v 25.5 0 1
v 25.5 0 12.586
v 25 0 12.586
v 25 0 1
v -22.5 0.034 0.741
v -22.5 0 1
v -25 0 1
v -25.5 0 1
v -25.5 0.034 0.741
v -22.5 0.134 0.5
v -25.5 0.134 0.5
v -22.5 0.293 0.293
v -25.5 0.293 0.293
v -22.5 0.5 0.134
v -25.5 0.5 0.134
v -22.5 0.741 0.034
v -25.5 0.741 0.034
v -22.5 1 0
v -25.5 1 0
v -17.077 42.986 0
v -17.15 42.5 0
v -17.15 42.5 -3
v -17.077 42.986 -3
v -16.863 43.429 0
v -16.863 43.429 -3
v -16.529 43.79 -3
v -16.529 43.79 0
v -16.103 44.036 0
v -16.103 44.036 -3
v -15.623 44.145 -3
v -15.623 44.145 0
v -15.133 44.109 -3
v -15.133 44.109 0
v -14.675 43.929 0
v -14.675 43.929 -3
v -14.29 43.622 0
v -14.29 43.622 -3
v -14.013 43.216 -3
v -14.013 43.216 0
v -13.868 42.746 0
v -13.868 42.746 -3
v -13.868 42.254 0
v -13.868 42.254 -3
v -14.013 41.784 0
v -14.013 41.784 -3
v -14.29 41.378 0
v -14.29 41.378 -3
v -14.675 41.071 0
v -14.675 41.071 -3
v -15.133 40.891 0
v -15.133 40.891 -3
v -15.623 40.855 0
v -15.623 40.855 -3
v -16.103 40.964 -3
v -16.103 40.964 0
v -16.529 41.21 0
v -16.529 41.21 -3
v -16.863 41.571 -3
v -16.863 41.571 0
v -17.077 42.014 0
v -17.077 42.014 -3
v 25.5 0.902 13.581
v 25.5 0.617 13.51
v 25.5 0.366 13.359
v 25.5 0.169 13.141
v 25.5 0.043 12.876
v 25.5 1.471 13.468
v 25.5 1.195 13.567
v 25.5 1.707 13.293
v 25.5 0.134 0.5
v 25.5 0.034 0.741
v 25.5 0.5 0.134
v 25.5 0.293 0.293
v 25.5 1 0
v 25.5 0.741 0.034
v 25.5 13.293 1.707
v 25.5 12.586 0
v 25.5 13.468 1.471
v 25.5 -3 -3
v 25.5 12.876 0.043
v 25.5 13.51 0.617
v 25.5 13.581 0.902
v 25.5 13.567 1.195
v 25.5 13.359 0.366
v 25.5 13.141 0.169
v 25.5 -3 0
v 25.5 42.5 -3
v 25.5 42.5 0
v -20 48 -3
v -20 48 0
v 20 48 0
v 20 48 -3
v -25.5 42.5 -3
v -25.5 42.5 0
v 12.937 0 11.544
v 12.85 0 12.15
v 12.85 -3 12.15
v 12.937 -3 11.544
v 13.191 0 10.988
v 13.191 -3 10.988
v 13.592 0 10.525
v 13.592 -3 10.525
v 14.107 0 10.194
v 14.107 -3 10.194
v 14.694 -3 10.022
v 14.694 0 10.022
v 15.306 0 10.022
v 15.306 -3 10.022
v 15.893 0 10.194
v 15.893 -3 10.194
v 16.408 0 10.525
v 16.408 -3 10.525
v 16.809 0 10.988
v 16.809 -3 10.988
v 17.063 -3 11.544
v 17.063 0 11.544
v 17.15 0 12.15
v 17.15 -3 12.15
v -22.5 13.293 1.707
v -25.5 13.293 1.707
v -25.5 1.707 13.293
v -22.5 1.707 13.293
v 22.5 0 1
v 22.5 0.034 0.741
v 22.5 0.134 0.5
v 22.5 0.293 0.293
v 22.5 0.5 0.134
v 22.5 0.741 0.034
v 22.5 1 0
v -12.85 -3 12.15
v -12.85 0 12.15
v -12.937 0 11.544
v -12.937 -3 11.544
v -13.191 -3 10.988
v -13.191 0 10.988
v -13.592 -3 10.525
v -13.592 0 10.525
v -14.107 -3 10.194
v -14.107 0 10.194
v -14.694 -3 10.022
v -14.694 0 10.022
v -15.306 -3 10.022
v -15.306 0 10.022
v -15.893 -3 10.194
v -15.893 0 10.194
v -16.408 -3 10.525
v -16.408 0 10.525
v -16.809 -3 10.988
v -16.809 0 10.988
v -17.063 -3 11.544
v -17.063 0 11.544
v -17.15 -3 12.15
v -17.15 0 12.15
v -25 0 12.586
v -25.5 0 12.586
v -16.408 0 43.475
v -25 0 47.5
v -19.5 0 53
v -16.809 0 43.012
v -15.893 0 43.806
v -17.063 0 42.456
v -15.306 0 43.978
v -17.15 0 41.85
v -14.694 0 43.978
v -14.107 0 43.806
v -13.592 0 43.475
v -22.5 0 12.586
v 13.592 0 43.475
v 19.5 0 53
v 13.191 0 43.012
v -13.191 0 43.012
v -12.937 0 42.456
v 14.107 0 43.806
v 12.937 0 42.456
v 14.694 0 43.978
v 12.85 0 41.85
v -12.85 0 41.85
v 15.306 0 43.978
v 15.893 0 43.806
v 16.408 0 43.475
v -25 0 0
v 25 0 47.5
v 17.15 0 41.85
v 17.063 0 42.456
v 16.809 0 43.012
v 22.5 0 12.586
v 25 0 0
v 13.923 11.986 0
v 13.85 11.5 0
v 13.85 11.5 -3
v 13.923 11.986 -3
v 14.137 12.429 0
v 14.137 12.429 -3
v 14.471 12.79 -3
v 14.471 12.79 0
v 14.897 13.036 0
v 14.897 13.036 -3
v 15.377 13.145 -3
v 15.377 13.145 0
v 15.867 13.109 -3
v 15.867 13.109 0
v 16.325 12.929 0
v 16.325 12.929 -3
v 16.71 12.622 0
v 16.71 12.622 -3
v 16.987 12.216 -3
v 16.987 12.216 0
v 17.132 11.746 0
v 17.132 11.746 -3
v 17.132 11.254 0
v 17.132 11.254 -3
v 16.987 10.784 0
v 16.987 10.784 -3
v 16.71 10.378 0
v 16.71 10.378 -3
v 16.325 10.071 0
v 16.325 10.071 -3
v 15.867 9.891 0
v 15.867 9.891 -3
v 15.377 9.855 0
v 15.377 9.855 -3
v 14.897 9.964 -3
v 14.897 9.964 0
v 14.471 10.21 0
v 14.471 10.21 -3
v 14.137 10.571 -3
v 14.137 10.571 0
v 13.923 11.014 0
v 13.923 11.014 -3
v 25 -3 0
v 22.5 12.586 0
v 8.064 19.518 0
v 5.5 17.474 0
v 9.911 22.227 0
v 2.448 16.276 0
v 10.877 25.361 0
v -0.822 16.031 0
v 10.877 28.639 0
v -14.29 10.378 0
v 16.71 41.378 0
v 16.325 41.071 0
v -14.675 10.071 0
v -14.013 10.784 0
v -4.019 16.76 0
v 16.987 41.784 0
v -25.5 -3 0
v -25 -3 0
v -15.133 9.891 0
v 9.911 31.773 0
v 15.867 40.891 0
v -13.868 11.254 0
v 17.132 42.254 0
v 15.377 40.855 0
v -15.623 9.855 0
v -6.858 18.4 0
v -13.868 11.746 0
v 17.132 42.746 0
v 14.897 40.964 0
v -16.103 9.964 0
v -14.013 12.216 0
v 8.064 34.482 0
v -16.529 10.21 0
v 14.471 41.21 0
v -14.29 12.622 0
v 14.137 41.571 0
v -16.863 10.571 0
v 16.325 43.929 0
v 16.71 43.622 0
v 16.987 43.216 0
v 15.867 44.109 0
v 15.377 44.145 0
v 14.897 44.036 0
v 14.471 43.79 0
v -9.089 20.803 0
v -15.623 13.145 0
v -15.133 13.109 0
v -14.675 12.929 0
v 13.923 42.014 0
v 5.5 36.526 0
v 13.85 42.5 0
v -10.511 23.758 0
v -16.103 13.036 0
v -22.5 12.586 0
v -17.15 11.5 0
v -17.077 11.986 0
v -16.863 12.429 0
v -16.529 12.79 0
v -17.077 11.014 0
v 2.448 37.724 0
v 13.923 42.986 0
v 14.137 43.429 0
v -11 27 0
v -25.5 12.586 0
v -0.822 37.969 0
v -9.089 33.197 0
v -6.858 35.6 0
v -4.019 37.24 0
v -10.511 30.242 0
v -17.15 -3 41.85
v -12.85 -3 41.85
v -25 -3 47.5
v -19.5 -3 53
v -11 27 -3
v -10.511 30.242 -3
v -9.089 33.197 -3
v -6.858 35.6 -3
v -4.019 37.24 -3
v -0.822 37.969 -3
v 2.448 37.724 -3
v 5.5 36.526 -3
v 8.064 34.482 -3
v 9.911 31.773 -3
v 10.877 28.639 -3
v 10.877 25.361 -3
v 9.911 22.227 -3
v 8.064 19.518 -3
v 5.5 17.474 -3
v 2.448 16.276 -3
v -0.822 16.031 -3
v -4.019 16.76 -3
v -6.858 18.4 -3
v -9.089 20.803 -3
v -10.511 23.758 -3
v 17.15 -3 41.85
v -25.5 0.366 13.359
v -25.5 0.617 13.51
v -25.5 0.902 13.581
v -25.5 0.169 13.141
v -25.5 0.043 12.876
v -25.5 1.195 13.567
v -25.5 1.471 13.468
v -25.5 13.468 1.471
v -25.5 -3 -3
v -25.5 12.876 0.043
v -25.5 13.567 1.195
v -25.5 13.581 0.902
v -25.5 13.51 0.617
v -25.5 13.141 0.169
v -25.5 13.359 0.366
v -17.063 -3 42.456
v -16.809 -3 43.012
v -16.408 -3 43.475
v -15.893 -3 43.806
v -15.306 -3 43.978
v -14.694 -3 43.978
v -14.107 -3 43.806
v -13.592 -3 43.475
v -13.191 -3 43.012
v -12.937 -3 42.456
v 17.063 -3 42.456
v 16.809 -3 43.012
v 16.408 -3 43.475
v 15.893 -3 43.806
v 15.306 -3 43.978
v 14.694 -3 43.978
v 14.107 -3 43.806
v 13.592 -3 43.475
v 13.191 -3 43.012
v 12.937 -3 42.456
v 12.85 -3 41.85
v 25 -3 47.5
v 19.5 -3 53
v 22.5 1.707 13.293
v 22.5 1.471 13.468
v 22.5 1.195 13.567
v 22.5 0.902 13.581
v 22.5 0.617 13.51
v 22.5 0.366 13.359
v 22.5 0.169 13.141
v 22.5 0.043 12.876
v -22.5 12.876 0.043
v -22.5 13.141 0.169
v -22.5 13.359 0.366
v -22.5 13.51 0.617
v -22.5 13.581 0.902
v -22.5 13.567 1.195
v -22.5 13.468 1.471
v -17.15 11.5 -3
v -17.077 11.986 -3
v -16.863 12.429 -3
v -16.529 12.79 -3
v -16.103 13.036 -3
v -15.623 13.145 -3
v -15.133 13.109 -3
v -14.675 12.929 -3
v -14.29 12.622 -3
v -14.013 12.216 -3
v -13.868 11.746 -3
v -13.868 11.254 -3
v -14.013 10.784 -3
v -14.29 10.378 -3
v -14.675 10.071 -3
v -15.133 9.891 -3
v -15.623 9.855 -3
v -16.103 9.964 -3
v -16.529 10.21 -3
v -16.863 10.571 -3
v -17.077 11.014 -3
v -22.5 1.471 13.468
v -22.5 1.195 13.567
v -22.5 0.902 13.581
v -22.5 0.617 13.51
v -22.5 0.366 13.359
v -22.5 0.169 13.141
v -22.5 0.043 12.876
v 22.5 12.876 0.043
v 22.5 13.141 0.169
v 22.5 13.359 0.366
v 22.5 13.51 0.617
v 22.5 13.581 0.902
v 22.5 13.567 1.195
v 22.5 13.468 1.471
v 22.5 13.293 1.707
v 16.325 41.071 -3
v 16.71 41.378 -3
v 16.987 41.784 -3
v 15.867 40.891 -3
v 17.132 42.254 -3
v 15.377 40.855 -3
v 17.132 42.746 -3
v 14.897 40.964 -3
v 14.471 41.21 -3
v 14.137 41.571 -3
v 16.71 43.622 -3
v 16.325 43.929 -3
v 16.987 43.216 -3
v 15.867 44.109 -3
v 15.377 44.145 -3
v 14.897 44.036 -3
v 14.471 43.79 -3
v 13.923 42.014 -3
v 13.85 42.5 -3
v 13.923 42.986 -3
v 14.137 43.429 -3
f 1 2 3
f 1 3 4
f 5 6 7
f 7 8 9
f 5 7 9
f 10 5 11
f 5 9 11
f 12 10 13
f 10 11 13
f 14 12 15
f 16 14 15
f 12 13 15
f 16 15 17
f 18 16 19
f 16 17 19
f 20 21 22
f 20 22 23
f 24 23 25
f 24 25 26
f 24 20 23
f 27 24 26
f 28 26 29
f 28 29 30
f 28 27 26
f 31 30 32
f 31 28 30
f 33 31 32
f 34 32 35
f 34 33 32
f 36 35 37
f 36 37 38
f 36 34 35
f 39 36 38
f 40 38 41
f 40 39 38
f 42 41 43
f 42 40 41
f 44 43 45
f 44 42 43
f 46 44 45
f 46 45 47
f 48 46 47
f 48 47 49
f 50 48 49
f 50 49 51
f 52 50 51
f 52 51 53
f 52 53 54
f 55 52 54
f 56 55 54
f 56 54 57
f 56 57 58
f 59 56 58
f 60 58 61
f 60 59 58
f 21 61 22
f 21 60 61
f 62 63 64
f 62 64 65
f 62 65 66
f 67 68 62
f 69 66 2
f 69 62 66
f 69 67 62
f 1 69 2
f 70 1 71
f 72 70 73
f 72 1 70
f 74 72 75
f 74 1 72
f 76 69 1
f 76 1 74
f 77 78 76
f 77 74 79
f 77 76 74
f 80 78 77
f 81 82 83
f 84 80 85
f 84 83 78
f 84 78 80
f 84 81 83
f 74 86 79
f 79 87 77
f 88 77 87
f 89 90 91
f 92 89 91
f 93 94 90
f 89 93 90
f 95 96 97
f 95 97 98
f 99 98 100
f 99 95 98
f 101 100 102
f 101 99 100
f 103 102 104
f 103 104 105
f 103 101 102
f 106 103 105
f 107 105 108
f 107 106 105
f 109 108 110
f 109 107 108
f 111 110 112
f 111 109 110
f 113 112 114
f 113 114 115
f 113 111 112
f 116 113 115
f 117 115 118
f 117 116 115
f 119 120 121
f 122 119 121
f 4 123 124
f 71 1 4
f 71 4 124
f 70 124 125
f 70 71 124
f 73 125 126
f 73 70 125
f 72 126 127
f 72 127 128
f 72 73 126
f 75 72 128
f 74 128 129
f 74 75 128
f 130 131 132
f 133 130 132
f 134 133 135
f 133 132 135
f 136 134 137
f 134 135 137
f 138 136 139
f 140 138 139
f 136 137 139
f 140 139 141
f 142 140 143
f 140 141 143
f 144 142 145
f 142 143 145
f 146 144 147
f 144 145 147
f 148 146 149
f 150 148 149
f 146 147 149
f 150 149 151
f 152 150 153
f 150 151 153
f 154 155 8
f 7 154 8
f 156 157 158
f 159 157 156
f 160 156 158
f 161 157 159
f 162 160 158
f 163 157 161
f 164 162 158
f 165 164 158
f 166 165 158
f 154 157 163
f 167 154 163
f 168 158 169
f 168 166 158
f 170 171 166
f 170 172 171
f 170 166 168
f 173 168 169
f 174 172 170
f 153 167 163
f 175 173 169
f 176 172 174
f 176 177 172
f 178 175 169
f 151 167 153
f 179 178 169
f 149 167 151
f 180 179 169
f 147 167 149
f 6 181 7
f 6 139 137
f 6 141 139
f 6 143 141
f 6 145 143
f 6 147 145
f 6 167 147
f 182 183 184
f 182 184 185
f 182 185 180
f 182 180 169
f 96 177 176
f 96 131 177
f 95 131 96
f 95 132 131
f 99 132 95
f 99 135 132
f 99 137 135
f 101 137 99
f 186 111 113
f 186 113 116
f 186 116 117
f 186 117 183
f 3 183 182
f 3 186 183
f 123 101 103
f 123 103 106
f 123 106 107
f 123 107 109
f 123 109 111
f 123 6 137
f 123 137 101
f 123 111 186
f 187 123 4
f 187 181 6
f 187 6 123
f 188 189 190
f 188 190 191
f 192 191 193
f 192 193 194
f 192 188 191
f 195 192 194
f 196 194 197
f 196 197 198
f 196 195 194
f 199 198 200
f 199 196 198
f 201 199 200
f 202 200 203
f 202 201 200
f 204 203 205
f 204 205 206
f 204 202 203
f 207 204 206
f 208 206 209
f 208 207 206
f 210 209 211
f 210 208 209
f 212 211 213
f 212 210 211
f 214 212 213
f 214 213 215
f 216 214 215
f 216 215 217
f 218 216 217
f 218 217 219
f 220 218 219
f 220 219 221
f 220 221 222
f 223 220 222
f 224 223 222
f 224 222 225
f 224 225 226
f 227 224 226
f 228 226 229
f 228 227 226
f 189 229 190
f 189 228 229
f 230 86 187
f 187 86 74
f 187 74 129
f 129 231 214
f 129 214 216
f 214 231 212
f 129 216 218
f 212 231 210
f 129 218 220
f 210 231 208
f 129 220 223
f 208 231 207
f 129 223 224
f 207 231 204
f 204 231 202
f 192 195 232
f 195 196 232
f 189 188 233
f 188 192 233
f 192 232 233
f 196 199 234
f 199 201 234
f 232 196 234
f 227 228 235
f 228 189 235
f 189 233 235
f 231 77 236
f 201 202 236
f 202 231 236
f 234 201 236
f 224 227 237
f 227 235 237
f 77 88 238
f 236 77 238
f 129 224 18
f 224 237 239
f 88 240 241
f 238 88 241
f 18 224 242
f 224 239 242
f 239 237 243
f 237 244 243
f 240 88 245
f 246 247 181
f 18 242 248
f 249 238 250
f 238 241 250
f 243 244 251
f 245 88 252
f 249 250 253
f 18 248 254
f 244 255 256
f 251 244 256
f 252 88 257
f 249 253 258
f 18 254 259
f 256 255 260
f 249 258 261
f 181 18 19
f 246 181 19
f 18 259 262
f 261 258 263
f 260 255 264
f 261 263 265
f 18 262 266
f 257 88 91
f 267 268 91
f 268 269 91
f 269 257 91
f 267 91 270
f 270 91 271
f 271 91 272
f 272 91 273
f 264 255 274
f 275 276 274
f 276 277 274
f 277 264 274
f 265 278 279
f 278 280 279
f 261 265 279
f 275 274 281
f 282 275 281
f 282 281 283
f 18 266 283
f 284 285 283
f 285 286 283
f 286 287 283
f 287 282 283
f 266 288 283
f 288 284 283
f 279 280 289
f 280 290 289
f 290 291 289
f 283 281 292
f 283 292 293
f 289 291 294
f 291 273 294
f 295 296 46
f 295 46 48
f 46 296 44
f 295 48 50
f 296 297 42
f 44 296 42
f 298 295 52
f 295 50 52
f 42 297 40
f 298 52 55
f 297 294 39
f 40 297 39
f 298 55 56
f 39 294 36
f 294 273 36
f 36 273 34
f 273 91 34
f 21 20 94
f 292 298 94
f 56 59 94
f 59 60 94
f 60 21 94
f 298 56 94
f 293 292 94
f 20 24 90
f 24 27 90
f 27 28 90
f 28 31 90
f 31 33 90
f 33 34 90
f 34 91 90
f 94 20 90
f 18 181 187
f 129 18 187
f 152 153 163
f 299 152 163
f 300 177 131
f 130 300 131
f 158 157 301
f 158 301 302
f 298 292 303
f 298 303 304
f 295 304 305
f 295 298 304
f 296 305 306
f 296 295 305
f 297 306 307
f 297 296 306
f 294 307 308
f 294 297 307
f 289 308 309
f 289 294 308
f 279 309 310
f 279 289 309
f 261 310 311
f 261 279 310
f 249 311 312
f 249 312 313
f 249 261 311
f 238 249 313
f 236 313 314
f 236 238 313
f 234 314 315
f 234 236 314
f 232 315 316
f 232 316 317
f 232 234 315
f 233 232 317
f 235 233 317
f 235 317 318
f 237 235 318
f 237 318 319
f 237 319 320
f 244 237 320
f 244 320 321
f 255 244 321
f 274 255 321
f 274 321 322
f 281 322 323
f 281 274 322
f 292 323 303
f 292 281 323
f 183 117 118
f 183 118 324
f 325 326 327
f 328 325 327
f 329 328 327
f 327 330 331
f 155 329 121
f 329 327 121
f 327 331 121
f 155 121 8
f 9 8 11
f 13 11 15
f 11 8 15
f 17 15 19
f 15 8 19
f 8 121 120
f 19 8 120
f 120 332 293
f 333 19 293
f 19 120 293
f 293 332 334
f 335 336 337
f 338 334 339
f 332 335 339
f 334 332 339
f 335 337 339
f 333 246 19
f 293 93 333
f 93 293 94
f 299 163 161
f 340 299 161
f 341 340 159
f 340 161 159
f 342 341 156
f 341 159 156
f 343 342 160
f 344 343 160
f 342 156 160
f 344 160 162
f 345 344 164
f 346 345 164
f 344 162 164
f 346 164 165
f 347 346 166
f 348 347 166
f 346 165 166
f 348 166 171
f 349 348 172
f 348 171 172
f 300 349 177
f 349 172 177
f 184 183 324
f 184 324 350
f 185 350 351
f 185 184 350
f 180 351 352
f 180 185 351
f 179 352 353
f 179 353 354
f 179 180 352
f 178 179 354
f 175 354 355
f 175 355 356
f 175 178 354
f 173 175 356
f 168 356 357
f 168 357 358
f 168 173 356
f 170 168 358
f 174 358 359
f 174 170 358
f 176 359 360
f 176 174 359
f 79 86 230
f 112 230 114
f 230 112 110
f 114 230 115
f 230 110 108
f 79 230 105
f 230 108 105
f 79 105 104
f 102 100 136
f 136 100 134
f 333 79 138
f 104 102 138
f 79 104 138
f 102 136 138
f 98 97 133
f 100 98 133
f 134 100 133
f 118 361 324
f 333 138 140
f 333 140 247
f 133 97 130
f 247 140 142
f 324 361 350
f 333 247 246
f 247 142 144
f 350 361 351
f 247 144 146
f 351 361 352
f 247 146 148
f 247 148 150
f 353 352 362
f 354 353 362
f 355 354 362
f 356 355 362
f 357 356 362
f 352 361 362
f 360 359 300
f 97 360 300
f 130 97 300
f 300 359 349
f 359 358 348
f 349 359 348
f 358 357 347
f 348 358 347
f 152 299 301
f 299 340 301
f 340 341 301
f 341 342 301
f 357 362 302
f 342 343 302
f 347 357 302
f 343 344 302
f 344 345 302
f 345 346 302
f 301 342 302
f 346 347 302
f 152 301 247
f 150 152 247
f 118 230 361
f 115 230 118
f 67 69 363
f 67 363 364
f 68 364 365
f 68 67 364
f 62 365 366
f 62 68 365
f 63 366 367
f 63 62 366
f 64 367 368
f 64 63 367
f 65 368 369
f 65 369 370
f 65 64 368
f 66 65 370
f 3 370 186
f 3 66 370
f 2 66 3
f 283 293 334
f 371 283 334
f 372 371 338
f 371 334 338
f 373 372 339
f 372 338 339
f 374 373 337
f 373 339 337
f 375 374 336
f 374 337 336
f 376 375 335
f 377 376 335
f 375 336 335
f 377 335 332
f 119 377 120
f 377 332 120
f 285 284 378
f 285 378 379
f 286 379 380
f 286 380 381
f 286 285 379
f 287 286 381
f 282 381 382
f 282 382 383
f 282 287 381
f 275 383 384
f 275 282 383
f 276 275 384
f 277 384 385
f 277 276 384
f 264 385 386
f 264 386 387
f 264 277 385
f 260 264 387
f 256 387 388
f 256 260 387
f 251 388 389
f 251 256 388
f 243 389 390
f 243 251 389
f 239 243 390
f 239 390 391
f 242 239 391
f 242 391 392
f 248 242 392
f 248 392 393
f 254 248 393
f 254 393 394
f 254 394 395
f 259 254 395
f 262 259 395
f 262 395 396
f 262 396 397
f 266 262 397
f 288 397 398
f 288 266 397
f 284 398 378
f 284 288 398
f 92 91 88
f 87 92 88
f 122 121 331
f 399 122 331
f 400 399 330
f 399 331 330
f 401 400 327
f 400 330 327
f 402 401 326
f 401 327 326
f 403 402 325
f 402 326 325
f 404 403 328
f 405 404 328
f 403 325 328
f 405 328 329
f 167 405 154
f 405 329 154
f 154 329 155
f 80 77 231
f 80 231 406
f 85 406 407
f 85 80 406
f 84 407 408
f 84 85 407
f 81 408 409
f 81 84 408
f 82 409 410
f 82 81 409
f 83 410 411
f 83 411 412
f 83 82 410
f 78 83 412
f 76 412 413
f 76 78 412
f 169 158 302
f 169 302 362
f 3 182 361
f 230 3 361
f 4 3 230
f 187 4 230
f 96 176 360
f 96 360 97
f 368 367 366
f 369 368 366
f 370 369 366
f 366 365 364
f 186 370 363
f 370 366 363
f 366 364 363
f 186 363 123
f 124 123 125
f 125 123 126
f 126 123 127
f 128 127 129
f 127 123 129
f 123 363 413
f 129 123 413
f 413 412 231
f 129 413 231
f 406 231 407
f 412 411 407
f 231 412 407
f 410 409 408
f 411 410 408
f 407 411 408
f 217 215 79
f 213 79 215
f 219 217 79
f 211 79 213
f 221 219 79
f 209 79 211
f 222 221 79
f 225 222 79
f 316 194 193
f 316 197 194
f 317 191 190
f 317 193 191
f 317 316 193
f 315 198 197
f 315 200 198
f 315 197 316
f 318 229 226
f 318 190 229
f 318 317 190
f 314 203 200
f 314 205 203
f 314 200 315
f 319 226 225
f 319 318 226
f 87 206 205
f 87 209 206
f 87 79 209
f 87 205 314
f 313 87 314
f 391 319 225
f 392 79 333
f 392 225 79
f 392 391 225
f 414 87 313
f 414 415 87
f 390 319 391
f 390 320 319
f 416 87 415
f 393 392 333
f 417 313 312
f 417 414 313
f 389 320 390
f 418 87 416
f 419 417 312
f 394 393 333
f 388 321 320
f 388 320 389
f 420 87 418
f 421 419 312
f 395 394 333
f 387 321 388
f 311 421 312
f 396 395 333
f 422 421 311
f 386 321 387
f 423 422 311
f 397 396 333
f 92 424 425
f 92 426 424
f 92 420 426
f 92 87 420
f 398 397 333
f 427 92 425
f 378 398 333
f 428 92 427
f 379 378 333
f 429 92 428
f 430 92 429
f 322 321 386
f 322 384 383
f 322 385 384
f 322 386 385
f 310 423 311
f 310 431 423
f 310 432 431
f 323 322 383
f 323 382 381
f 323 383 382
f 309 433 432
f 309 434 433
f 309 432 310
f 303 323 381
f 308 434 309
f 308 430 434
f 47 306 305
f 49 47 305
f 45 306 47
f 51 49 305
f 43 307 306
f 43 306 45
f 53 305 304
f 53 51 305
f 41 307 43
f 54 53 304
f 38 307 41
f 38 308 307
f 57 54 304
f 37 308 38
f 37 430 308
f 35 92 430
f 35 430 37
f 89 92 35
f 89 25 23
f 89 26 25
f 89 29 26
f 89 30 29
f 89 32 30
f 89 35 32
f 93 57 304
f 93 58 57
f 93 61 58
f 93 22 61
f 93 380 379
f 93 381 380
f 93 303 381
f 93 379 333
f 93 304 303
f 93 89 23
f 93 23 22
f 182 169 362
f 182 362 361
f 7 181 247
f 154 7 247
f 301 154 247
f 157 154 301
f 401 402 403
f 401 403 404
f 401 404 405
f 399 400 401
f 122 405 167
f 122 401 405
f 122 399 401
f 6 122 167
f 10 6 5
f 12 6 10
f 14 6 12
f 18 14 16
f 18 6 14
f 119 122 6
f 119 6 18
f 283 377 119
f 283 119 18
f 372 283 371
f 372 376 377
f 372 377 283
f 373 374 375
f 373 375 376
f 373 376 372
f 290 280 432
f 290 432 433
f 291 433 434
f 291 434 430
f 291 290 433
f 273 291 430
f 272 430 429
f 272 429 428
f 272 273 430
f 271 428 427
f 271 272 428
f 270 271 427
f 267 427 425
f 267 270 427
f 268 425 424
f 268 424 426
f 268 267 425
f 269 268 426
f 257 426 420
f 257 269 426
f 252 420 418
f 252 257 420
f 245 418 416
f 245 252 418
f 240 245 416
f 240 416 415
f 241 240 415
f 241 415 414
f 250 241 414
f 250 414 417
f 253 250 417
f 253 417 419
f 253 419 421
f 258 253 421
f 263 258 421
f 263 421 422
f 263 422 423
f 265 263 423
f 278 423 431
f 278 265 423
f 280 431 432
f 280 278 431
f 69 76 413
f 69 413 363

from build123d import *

# Parameters (mm, degrees)
EXTRUDE_1_DEPTH = 3
SKETCH_2_R      = 11
SKETCH_2_R_2    = 1.65
EXTRUDE_2_DEPTH = 3
EXTRUDE_3_DEPTH = 3


with BuildPart() as part:
    # 草图1 → 凸台-拉伸1 (new body)
    with BuildSketch(Plane(origin=(0, 0, 0), x_dir=(1, 0, 0), z_dir=(0, 1, 0))):
        Polygon((19.5, -53), (25, -47.5), (25, 0), (-25, 0), (-25, -47.5), (-19.5, -53), align=None)
        with BuildLine():
            Line((17.15, -12.15), (17.15, -41.85))
            ThreePointArc((17.15, -41.85), (15, -44), (12.85, -41.85))
            Line((12.85, -41.85), (12.85, -12.15))
            ThreePointArc((12.85, -12.15), (15, -10), (17.15, -12.15))
        make_face(mode=Mode.SUBTRACT)
        with BuildLine():
            Line((-17.15, -12.15), (-17.15, -41.85))
            ThreePointArc((-17.15, -41.85), (-15, -44), (-12.85, -41.85))
            Line((-12.85, -41.85), (-12.85, -12.15))
            ThreePointArc((-12.85, -12.15), (-15, -10), (-17.15, -12.15))
        make_face(mode=Mode.SUBTRACT)
    extrude(amount=-EXTRUDE_1_DEPTH)

    # 草图2 → 凸台-拉伸2 (add)
    with BuildSketch(Plane(origin=(0, 0, 0), x_dir=(-1, 0, 0), z_dir=(0, 0, -1))):
        Polygon((-25.5, -3), (25.5, -3), (25.5, 42.5), (20, 48), (-20, 48), (-25.5, 42.5), align=None)
        with Locations((0, 27)):
            Circle(SKETCH_2_R, mode=Mode.SUBTRACT)
        with Locations((-15.5, 42.5)):
            Circle(SKETCH_2_R_2, mode=Mode.SUBTRACT)
        with Locations((-15.5, 11.5)):
            Circle(SKETCH_2_R_2, mode=Mode.SUBTRACT)
        with Locations((15.5, 11.5)):
            Circle(SKETCH_2_R_2, mode=Mode.SUBTRACT)
        with Locations((15.5, 42.5)):
            Circle(SKETCH_2_R_2, mode=Mode.SUBTRACT)
    extrude(amount=EXTRUDE_2_DEPTH)

    # 草图4 → 凸台-拉伸3 (add)
    with BuildSketch(Plane(origin=(25.5, 0, 0), x_dir=(0, 0, -1), z_dir=(1, 0, 0))):
        with BuildLine():
            Line((-1.707106781, 13.292893219), (-13.292893219, 1.707106781))
            ThreePointArc((-13.292893219, 1.707106781), (-13.50966597, 0.617316568), (-12.585786438, 0))
            Line((-12.585786438, 0), (-1, 0))
            ThreePointArc((-1, 0), (-0.292893219, 0.292893219), (0, 1))
            Line((0, 1), (0, 12.585786438))
            ThreePointArc((0, 12.585786438), (-0.617316568, 13.50966597), (-1.707106781, 13.292893219))
        make_face()
    extrude_3 = extrude(amount=-EXTRUDE_3_DEPTH)

    # 镜向1: 凸台-拉伸3 across plane
    add(extrude_3.mirror(Plane(origin=(0, 0, 0), x_dir=(0, 0, 1), z_dir=(1, 0, 0))))


solid = part.part
